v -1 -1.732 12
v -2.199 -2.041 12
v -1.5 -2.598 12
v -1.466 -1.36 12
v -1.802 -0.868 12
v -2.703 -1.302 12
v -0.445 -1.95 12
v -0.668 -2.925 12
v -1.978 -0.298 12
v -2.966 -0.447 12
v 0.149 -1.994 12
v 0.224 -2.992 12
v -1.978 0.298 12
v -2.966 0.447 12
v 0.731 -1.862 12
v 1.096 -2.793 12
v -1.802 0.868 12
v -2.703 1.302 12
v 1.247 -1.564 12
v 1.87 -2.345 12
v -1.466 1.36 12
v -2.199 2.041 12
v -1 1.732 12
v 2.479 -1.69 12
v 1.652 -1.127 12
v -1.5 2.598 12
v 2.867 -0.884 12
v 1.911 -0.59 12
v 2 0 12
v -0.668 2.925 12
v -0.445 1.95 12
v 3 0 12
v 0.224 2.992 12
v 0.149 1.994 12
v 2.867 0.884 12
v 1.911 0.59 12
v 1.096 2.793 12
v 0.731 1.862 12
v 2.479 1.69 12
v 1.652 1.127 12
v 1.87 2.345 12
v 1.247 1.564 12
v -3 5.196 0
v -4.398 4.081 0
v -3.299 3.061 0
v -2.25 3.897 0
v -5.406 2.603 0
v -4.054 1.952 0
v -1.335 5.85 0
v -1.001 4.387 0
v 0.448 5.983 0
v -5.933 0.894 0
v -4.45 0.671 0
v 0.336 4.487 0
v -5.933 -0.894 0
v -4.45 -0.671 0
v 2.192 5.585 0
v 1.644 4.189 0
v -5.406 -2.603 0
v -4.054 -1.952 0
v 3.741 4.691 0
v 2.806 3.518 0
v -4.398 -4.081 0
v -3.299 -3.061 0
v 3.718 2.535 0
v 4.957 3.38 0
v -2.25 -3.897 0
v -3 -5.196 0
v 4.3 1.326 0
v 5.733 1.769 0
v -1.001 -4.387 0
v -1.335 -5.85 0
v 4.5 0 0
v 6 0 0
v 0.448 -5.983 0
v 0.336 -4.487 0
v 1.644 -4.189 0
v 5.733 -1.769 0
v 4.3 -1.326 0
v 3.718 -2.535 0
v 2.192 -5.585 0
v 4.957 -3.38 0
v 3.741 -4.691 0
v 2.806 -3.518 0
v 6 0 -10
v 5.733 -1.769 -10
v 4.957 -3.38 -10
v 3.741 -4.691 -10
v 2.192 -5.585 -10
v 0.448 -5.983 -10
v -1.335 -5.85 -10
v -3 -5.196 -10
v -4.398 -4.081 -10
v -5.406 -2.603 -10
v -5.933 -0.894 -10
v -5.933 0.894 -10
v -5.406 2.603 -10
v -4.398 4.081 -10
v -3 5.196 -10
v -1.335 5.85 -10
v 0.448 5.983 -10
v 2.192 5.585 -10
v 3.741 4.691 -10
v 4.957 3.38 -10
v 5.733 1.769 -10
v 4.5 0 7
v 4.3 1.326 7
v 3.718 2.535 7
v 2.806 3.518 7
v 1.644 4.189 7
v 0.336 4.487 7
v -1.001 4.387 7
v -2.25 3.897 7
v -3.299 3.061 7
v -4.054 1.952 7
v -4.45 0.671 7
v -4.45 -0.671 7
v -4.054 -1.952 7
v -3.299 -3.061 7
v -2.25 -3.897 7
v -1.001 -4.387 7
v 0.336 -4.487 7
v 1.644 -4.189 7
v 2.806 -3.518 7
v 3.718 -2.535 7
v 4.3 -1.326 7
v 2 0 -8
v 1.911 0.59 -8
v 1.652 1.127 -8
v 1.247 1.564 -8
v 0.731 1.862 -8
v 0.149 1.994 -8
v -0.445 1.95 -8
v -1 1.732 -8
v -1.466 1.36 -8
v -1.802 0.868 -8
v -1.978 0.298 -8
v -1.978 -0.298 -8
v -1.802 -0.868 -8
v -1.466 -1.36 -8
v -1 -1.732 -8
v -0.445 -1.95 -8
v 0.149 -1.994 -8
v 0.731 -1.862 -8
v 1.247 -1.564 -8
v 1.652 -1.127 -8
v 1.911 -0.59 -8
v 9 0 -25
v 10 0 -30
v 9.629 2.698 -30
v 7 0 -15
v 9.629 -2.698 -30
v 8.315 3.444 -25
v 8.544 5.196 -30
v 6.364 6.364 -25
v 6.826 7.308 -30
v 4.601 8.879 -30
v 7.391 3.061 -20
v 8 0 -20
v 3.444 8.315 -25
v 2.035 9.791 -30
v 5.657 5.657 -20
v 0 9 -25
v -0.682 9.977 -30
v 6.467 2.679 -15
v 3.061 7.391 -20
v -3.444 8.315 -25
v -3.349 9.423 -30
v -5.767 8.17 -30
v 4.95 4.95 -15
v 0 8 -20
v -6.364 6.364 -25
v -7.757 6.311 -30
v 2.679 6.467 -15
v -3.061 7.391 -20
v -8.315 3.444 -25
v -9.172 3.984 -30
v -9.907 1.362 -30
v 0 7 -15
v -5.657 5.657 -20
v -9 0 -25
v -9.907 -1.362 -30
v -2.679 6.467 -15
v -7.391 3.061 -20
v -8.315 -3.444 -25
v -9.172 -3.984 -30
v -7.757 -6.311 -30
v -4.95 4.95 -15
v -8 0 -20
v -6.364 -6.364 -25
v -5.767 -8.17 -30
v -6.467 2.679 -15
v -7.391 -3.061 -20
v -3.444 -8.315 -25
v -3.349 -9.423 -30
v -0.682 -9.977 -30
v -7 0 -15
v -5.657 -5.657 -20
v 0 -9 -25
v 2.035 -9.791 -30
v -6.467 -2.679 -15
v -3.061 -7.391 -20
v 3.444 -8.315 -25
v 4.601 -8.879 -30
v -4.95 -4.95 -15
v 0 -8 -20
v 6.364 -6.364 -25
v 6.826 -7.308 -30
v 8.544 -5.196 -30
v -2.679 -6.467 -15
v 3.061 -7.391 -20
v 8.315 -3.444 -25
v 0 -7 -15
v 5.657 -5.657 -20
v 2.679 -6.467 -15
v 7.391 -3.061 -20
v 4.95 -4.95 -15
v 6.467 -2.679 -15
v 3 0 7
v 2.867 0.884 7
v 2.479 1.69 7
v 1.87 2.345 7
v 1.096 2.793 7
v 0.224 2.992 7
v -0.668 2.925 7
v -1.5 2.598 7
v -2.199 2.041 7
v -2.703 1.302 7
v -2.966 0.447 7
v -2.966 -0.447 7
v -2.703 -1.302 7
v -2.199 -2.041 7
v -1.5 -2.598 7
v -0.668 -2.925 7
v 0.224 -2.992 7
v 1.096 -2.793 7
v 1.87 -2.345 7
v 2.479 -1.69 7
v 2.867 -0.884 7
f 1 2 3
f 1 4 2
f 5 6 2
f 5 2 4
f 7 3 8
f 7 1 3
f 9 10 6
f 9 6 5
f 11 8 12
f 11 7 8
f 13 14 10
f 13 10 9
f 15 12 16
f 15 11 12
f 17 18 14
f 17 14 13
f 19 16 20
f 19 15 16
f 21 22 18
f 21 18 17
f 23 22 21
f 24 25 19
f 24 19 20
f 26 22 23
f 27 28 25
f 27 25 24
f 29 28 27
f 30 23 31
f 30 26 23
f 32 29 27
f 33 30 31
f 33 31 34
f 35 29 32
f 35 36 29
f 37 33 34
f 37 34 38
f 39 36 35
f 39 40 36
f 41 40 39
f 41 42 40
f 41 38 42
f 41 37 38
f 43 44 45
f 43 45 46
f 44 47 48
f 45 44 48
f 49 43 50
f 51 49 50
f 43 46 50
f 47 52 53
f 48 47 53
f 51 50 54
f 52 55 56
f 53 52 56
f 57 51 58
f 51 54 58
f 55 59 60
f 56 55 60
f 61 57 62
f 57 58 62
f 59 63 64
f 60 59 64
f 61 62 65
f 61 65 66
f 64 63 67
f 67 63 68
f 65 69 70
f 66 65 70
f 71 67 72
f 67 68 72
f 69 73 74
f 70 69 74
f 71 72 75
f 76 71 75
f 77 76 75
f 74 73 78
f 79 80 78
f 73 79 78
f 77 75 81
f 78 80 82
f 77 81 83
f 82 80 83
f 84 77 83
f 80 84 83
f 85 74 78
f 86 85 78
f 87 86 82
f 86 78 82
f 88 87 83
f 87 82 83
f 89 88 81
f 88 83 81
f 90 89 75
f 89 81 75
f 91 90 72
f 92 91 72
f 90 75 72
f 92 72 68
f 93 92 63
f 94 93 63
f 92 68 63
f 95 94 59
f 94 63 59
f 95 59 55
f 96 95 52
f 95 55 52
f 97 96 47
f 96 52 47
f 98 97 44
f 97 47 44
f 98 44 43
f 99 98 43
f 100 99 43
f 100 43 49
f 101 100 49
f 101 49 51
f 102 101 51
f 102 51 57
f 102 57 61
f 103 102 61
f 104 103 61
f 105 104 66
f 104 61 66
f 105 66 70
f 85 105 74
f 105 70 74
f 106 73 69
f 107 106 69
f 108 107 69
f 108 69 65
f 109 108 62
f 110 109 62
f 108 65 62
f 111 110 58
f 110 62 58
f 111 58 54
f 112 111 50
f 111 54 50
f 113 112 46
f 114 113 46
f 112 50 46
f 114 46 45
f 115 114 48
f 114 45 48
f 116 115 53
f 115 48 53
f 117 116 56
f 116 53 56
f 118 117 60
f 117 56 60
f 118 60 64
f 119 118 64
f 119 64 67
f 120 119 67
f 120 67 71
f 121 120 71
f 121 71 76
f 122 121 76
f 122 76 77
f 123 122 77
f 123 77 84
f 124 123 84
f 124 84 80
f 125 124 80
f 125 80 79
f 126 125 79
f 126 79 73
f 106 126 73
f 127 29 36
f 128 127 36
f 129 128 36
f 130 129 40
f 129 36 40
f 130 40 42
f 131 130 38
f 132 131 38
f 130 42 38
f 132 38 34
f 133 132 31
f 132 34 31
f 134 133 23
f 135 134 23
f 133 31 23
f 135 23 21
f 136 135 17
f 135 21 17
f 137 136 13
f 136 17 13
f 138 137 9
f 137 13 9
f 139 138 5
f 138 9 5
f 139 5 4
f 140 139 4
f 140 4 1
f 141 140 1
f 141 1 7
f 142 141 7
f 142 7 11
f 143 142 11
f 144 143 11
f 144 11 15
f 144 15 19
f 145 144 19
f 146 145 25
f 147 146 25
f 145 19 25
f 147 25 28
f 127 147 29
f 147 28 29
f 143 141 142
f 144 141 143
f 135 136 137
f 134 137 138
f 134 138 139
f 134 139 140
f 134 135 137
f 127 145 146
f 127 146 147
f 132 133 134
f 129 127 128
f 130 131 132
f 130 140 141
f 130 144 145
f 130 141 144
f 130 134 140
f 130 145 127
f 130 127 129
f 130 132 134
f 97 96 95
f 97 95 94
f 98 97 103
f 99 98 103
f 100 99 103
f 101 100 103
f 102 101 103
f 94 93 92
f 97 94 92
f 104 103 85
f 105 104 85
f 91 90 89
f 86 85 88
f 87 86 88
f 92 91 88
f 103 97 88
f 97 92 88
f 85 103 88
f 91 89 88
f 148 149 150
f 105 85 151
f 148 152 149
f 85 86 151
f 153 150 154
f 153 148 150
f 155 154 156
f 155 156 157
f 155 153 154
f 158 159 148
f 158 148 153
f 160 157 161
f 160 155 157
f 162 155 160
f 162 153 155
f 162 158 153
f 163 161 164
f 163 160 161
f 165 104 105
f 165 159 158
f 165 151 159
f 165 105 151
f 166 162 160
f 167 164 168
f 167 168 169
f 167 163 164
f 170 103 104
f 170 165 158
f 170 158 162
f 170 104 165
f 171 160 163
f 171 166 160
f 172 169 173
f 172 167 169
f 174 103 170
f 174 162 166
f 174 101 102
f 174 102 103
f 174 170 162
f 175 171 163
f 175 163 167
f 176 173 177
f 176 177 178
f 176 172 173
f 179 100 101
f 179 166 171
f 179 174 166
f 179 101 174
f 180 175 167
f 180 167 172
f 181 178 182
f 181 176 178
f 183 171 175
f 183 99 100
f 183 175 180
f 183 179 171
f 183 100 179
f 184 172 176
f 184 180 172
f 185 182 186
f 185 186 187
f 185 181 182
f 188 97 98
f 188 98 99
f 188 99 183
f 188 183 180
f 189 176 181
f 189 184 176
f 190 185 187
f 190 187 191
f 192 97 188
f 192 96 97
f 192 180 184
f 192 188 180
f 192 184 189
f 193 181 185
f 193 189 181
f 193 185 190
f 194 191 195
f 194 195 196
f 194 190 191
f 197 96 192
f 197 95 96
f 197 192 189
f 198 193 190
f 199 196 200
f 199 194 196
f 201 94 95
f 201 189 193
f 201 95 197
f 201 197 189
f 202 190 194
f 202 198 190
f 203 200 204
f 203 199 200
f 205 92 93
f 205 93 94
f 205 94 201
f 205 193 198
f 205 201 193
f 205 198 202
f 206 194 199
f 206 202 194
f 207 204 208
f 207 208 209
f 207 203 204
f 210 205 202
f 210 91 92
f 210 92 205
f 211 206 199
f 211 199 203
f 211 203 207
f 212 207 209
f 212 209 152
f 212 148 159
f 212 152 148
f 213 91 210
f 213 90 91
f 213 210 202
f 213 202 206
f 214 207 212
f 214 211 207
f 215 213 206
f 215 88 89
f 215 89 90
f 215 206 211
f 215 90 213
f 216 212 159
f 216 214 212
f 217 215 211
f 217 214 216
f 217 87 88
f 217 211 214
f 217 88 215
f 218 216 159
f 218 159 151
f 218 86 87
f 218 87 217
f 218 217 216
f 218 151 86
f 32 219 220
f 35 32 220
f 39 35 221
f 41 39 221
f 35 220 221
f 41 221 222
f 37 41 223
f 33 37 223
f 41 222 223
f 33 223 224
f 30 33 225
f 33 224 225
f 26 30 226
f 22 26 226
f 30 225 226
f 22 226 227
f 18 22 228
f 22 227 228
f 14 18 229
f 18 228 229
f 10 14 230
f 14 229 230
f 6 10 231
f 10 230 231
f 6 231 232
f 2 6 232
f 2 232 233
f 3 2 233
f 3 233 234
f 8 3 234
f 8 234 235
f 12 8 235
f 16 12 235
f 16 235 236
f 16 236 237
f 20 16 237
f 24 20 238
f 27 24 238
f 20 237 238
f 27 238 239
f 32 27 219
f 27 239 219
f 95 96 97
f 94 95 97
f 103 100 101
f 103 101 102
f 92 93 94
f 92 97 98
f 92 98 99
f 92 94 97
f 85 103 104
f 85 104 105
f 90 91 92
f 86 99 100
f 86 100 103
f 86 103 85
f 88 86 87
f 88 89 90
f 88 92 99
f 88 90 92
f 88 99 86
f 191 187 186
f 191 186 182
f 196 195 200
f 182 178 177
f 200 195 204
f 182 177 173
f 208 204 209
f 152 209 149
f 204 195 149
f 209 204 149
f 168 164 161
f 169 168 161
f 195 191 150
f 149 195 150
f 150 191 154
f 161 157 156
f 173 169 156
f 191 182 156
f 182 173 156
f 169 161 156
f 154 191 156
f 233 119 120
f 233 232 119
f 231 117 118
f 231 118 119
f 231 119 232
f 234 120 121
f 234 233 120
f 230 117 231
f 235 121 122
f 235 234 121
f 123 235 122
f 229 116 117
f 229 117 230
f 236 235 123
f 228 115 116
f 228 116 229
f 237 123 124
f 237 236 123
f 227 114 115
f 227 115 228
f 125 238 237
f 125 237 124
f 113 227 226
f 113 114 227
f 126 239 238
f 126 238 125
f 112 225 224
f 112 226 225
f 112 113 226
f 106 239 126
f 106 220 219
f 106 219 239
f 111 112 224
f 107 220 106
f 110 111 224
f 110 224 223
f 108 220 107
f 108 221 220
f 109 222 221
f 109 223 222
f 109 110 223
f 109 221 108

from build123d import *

# Parameters (mm, degrees)
F0_R      = 4.5
F1_DEPTH  = 7
F2_R      = 3
F3_DEPTH  = 5
F4_R      = 6
F5_DEPTH  = 10
F8_R      = 10
F6_R      = 6
F10_R     = 2
F11_DEPTH = 20


with BuildPart() as f1:
    # F0 (on Top) → F1 (new body)
    with BuildSketch(Plane.XY):
        Circle(F0_R)
    extrude(amount=F1_DEPTH)

    # F2 (on face) + F0 (on Top) → F3 (join)
    with BuildSketch(Plane.XY.offset(7)):
        Circle(F2_R)
    with BuildSketch(Plane.XY):
        Circle(F0_R)
    extrude(amount=F3_DEPTH)

    # F4 (on face) → F5 (join)
    with BuildSketch(Plane(origin=(0, 0, 0), x_dir=(1, 0, 0), z_dir=(0, 0, -1))):
        Circle(F4_R)
    extrude(amount=F5_DEPTH)

    # F10 (on face) → F11 (cut)
    with BuildSketch(Plane.XY.offset(12)):
        Circle(F10_R)
    extrude(amount=-F11_DEPTH, mode=Mode.SUBTRACT)


with BuildPart() as f9:
    # F8 (on offset) → F9 section 0
    with BuildSketch(Plane.XY.offset(-30)):
        Circle(F8_R)
    # F6 (on face) → F9 section 1
    with BuildSketch(Plane(origin=(0, 0, -10), x_dir=(1, 0, 0), z_dir=(0, 0, -1))):
        Circle(F6_R)
    loft()


solid = Compound([f1.part, f9.part])
